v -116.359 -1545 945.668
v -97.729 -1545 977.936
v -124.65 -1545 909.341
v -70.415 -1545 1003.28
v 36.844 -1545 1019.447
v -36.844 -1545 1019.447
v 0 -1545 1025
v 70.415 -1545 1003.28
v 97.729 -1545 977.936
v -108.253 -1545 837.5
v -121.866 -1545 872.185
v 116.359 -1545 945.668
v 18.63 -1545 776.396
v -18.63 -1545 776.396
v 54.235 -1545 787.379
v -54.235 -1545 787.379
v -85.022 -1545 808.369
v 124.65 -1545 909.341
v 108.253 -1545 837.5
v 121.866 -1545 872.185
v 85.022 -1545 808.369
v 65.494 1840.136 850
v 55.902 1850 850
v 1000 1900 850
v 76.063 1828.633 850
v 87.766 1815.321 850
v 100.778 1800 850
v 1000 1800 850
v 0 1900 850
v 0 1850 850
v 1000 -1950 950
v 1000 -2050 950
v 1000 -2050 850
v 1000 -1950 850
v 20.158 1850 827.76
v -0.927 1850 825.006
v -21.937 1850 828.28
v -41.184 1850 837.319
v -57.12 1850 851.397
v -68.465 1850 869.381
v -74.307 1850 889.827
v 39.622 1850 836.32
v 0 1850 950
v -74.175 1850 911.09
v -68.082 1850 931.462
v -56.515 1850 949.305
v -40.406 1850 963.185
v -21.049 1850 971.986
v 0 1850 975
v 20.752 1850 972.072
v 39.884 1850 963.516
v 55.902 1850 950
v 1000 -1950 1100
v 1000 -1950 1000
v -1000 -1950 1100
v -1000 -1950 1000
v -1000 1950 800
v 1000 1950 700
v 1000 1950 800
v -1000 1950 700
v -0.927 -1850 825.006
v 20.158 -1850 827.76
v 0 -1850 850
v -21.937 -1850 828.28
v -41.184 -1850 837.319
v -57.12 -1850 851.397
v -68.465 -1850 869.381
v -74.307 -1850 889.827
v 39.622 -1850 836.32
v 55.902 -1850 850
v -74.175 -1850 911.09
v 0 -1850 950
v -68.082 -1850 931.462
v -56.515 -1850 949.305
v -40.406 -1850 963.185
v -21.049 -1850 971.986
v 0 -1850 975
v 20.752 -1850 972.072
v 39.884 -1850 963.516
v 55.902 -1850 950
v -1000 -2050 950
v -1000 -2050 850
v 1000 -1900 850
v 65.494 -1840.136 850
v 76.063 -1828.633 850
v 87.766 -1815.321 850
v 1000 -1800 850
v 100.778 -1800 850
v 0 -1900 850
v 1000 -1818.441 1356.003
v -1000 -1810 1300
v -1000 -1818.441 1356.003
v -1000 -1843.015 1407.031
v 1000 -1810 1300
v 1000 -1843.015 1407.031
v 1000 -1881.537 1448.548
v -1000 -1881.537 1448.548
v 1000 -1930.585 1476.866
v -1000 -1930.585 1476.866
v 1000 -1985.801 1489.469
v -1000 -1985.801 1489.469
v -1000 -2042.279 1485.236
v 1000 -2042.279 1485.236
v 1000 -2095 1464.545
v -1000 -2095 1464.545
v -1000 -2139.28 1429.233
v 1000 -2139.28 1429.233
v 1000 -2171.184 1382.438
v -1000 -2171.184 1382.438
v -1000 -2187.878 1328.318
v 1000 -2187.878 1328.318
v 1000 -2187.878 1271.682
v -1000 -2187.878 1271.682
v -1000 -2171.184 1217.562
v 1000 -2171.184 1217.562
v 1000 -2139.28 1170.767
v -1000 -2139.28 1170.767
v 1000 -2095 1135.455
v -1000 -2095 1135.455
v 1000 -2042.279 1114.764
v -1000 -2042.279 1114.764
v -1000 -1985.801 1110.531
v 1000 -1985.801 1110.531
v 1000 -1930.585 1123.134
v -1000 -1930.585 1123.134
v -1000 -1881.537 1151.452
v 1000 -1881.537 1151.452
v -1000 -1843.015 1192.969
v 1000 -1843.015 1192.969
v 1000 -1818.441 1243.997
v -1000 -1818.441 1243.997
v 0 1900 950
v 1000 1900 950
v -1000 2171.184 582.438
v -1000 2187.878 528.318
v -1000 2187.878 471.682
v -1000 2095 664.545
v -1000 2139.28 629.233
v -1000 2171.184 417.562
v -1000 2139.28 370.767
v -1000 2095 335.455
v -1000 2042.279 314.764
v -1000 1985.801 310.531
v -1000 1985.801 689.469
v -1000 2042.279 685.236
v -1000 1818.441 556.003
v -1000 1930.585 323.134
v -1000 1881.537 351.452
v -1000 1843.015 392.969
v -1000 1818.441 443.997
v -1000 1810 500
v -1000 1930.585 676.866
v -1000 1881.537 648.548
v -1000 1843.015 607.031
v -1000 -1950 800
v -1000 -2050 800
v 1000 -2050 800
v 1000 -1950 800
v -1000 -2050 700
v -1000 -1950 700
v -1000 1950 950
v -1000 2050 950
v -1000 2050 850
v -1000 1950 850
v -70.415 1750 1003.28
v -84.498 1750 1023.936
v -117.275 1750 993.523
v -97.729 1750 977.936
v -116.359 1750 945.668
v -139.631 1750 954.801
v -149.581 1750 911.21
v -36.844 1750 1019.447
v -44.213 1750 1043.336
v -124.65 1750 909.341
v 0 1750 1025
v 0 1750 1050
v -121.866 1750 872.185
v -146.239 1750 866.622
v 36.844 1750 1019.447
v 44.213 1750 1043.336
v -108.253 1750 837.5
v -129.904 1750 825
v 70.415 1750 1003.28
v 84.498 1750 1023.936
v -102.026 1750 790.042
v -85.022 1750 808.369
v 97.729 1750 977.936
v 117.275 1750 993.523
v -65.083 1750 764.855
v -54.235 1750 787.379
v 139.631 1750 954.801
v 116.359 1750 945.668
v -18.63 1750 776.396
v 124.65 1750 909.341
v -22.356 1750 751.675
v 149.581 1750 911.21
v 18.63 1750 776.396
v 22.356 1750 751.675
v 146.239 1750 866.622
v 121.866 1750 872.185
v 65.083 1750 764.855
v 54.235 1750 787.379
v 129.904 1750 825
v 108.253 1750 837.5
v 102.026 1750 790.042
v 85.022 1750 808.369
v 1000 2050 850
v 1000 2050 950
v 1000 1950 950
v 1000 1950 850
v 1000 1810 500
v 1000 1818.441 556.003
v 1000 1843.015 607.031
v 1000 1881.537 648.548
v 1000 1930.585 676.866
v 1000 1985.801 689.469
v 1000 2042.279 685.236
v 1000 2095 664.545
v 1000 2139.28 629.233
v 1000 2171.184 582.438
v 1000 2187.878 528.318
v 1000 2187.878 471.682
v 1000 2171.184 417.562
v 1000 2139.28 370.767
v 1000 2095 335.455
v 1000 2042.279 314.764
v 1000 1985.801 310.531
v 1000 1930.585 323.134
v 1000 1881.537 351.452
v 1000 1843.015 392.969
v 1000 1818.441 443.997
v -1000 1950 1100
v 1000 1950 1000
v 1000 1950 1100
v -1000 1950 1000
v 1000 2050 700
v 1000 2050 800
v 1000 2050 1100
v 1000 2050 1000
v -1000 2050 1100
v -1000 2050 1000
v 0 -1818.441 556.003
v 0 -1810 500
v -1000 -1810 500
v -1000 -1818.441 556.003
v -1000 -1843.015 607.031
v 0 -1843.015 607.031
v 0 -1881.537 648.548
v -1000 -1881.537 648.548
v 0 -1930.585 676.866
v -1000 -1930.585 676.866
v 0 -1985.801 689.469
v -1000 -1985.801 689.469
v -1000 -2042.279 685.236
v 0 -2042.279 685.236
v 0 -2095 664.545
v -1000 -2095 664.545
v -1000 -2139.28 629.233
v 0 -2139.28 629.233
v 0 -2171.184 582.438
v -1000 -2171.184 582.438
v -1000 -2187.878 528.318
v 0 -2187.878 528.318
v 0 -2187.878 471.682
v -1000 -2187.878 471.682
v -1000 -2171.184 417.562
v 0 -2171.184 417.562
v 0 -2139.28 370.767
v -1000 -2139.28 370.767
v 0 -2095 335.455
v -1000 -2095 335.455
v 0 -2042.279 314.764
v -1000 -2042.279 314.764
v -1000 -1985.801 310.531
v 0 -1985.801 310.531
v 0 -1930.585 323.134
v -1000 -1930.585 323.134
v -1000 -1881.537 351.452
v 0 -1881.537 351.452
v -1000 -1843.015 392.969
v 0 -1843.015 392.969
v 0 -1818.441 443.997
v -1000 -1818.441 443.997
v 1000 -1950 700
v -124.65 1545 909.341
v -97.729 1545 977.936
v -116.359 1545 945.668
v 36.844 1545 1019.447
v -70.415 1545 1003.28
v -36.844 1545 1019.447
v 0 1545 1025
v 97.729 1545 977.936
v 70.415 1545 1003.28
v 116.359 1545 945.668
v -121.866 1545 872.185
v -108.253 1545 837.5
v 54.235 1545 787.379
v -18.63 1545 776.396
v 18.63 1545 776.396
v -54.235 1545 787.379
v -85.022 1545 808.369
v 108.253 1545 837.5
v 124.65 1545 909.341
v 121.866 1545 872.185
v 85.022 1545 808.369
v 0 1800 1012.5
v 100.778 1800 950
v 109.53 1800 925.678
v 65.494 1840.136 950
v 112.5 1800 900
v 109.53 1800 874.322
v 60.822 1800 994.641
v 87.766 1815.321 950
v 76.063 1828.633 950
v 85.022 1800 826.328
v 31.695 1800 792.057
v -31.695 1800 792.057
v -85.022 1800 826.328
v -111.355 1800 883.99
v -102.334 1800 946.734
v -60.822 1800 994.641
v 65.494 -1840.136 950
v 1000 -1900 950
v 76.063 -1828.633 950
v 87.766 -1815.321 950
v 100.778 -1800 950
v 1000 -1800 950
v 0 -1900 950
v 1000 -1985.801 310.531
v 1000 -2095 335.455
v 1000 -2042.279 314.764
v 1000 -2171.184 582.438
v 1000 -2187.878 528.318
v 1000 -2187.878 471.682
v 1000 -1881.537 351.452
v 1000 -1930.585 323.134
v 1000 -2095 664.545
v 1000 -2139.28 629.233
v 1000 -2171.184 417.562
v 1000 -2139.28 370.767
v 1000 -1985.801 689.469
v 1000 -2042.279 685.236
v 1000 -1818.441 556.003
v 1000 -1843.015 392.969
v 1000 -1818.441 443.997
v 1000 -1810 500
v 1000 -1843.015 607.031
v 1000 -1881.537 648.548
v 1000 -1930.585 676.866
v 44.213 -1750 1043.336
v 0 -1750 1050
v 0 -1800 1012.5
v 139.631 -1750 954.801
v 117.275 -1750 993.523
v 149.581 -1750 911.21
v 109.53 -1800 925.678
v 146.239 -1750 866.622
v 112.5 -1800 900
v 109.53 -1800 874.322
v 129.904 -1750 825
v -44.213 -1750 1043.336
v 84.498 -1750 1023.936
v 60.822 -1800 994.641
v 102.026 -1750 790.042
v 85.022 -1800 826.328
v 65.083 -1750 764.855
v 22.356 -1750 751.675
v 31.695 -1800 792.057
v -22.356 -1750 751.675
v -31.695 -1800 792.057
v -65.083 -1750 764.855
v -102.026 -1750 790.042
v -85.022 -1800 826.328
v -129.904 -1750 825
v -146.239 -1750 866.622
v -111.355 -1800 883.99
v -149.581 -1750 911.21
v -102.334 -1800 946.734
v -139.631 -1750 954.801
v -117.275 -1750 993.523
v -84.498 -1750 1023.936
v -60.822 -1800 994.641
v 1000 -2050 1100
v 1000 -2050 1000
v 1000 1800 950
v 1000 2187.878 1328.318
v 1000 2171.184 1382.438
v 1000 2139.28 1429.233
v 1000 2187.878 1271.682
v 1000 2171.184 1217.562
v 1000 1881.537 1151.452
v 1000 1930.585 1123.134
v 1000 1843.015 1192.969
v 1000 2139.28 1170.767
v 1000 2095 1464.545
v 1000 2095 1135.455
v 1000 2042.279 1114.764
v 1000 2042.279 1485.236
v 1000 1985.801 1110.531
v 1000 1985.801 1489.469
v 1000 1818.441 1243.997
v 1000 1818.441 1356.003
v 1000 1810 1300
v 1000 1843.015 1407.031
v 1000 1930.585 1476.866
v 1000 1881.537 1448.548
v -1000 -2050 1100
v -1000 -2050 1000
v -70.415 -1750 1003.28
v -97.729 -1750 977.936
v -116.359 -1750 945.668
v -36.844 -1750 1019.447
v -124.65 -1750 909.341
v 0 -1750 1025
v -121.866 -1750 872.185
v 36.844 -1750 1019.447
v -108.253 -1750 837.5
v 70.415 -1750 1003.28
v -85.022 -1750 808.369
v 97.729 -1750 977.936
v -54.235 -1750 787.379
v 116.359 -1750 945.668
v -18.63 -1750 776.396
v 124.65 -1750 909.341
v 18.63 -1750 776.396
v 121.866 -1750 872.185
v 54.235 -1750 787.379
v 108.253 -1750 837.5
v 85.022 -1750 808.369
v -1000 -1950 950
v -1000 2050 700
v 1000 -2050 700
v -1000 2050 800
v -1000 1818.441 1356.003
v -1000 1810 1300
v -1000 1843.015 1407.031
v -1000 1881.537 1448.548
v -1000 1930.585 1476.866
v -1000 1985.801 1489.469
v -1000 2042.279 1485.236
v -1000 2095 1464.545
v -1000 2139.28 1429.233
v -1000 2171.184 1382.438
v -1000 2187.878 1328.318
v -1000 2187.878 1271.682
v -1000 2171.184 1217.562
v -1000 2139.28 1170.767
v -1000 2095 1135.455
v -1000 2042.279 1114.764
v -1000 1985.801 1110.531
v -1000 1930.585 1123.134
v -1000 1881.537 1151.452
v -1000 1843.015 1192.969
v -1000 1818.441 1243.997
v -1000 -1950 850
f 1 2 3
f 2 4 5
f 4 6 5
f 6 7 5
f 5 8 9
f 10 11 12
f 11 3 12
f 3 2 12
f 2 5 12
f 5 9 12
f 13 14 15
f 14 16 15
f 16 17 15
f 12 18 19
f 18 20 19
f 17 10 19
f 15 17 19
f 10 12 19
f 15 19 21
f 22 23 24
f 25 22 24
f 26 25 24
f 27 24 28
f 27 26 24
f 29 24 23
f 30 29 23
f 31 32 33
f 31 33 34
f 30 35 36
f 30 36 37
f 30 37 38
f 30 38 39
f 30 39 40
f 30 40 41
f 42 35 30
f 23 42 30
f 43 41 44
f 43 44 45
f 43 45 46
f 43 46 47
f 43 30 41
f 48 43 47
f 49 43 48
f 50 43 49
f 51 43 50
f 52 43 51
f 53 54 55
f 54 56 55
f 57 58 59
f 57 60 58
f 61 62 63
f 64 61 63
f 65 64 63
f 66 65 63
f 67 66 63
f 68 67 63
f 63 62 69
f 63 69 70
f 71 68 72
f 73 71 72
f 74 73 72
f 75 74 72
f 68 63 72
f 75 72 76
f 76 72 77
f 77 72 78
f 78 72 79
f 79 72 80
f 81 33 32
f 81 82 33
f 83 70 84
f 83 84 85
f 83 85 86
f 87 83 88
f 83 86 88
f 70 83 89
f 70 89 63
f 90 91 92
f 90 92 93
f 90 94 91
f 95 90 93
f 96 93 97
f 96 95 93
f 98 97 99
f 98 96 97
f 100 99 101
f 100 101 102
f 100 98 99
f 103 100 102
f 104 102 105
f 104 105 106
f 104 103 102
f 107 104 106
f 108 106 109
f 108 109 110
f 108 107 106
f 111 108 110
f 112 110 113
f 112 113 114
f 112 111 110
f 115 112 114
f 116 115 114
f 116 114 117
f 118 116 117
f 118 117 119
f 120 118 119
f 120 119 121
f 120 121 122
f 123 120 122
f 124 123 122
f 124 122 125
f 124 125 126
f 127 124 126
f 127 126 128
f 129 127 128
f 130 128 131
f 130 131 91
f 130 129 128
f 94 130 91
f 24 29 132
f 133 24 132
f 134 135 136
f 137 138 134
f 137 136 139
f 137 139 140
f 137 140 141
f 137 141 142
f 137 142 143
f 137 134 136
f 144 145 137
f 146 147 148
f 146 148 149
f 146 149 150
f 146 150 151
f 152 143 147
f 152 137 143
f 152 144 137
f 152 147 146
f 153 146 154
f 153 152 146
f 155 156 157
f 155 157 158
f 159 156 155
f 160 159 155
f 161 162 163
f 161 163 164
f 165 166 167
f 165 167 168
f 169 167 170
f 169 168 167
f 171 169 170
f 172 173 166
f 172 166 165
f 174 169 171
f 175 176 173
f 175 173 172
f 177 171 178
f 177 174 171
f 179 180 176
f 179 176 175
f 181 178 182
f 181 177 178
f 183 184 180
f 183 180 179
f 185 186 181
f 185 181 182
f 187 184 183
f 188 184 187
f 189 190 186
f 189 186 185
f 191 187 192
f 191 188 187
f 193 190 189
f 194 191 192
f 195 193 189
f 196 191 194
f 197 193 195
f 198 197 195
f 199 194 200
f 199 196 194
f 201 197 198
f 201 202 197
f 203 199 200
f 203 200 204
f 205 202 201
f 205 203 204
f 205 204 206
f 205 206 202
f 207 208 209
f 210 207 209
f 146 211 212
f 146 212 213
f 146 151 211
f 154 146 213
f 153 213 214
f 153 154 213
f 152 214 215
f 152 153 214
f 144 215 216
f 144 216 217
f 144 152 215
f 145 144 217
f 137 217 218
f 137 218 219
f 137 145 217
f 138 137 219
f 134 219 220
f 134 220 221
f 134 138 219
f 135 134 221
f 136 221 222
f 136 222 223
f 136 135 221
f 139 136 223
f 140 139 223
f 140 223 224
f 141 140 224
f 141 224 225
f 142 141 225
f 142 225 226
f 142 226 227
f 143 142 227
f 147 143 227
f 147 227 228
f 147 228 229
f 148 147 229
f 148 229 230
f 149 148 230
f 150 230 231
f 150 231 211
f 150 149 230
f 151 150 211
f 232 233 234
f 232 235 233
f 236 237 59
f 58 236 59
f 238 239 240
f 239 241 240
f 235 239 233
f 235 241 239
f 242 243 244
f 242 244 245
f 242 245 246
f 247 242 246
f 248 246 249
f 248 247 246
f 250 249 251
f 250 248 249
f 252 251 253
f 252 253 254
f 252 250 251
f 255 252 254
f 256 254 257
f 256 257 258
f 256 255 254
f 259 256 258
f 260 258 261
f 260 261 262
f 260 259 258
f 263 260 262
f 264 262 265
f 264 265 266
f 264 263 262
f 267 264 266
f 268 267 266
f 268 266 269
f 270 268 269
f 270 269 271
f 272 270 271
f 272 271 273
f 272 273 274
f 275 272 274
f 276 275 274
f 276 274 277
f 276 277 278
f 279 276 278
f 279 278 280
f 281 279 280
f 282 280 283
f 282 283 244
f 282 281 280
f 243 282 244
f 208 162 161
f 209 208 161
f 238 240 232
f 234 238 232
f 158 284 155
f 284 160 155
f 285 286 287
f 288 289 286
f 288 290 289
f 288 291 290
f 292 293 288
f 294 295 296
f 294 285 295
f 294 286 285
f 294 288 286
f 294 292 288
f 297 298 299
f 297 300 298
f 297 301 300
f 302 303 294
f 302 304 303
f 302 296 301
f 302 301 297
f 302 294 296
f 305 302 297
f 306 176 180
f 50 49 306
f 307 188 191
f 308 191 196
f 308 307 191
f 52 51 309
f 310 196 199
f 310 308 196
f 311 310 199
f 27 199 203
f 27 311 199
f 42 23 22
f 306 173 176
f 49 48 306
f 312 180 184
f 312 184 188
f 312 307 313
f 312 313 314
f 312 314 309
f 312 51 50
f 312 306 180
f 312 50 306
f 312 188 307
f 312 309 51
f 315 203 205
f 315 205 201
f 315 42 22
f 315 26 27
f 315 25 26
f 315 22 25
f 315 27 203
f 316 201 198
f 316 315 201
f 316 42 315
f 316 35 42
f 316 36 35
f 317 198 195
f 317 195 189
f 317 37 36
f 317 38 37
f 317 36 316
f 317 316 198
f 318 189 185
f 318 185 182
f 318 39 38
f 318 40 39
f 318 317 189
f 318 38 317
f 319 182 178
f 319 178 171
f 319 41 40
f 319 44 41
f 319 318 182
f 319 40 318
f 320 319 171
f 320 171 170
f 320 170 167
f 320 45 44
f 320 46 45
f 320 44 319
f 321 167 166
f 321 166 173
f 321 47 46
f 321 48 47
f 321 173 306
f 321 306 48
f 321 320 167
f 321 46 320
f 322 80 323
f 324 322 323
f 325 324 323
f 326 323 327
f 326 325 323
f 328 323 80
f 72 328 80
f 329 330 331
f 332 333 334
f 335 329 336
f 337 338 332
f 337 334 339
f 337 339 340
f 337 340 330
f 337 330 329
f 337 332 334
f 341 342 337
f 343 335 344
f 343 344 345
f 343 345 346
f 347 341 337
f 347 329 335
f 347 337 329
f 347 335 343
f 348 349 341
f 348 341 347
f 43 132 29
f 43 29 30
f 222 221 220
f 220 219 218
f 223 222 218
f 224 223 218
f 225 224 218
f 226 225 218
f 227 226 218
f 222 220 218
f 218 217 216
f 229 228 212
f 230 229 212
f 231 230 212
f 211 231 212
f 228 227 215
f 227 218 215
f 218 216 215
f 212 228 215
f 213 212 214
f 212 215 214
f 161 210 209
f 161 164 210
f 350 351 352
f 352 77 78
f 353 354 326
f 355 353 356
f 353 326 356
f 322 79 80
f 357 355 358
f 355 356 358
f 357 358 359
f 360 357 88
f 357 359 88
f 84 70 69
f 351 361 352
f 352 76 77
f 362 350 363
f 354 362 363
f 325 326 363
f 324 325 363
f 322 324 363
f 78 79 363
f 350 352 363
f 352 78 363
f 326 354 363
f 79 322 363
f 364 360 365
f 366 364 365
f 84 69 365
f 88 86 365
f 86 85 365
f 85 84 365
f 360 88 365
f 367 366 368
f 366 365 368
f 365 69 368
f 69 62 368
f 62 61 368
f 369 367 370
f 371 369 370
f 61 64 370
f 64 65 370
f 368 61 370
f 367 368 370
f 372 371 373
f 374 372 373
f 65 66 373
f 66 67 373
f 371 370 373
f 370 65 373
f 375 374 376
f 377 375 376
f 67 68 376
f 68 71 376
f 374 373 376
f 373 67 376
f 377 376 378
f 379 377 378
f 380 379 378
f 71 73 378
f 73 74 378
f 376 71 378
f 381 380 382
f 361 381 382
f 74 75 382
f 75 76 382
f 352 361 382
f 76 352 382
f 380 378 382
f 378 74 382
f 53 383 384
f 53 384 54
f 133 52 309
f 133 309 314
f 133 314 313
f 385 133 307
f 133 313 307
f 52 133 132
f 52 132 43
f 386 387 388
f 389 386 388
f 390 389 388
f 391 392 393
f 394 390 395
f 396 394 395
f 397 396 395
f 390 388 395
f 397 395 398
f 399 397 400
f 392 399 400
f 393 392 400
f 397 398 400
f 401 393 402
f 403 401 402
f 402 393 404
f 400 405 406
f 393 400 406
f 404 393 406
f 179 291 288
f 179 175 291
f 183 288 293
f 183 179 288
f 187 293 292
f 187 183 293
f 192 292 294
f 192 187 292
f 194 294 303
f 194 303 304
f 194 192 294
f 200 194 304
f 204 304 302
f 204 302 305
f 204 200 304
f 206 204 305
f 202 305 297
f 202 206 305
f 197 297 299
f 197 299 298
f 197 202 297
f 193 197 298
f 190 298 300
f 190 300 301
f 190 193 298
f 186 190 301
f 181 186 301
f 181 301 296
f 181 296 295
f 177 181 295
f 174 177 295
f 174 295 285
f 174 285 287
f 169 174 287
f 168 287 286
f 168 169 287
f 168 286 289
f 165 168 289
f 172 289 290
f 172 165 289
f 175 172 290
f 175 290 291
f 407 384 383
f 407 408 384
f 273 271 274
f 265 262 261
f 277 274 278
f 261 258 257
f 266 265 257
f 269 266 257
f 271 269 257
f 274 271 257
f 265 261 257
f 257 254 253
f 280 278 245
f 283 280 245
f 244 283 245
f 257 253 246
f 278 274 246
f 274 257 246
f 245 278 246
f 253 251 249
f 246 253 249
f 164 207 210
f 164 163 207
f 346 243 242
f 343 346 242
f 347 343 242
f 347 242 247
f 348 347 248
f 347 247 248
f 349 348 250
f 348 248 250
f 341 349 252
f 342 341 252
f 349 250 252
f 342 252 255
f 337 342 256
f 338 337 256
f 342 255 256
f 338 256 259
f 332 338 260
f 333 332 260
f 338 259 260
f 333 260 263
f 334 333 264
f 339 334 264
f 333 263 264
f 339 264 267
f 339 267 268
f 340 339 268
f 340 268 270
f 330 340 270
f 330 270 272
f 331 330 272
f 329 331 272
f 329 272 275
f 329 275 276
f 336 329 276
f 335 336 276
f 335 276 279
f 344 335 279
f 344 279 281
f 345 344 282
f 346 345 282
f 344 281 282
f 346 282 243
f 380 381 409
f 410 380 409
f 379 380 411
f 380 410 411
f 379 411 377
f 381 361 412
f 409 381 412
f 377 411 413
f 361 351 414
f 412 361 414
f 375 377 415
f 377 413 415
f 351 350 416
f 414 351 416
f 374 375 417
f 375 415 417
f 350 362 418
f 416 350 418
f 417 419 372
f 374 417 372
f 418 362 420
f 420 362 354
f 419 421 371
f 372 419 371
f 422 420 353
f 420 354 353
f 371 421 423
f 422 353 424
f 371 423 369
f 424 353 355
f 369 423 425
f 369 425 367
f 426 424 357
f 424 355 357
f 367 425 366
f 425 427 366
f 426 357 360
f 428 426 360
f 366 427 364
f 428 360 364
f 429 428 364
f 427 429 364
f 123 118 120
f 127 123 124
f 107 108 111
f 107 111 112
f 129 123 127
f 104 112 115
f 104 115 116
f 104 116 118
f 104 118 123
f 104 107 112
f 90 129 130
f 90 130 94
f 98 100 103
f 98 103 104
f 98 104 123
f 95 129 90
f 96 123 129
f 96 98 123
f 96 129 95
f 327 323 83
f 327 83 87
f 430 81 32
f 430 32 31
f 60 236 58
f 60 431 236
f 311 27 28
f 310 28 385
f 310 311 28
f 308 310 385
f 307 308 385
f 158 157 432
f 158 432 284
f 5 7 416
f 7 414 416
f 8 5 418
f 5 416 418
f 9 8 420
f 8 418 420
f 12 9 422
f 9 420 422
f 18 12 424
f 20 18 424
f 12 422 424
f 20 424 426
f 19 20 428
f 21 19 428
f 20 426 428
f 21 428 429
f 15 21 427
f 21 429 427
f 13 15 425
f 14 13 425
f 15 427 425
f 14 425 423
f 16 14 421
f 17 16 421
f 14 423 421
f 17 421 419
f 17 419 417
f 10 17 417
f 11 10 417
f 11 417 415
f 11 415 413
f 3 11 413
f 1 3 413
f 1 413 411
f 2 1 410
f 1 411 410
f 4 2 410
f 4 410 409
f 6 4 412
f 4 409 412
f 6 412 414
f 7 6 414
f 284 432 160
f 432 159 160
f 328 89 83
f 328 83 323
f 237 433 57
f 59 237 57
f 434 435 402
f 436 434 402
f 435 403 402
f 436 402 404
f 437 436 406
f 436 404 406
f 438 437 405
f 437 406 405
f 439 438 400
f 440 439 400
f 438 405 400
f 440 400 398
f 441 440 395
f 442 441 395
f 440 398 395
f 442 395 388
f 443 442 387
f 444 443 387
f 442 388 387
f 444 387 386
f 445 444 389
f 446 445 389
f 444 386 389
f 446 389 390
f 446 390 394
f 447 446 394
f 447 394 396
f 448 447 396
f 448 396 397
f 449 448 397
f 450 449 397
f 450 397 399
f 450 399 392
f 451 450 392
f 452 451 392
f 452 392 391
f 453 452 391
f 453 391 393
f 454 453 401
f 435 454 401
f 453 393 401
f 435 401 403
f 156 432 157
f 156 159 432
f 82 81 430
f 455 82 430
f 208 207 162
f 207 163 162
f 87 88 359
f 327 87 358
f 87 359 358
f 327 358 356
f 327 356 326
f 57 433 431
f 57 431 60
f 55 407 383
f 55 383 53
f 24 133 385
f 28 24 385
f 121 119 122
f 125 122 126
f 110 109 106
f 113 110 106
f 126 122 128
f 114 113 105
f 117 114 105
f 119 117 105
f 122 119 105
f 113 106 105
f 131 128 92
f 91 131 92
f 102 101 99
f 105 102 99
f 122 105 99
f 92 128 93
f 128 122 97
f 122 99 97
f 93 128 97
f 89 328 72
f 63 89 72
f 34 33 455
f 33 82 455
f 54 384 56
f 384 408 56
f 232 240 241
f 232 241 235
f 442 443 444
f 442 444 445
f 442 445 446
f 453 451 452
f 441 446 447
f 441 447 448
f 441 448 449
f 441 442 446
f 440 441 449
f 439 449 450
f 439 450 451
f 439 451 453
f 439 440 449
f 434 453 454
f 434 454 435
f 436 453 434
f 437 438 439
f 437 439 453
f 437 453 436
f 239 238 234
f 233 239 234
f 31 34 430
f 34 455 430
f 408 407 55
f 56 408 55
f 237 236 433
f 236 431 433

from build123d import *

# Parameters (mm, degrees)
F0_W     = 100
F0_H     = 100
F0_R     = 190
F1_DEPTH = 1000
F2_W     = 100
F2_H     = 100
F3_DEPTH = 1000


with BuildPart() as f1:
    # F0 (on Right) → F1 (new body, symmetric)
    with BuildSketch(Plane.YZ):
        with Locations((-2000, 900)):
            Rectangle(F0_W, F0_H)
        with Locations((-2000, 750)):
            Rectangle(F0_W, F0_H)
        with Locations((-2000, 1050)):
            Rectangle(F0_W, F0_H)
        with Locations((-2000, 500)):
            Circle(F0_R)
        with Locations((-2000, 1300)):
            Circle(F0_R)
    extrude(amount=F1_DEPTH, both=True)


with BuildPart() as f3:
    # F2 (on Right) → F3 (new body, through all)
    with BuildSketch(Plane.YZ):
        with Locations((-1850, 900)):
            Rectangle(F2_W, F2_H)
    extrude(amount=F3_DEPTH)

    # F4 (on Right) → F5 (revolve)
    with BuildSketch(Plane.YZ):
        Polygon((-1850, 975), (-1850, 900), (-1545, 900), (-1545, 1025), (-1750, 1025), (-1750, 1050), align=None)
    revolve(axis=Axis((0, -1850, 900), (0, 1, 0)))


with BuildPart() as f6_1:
    # F6: instance of F3
    add(f3.part.mirror(Plane.XZ))


with BuildPart() as f6_2:
    # F6: instance of F1
    add(f1.part.mirror(Plane.XZ))


solid = Compound([f1.part, f3.part, f6_1.part, f6_2.part])
